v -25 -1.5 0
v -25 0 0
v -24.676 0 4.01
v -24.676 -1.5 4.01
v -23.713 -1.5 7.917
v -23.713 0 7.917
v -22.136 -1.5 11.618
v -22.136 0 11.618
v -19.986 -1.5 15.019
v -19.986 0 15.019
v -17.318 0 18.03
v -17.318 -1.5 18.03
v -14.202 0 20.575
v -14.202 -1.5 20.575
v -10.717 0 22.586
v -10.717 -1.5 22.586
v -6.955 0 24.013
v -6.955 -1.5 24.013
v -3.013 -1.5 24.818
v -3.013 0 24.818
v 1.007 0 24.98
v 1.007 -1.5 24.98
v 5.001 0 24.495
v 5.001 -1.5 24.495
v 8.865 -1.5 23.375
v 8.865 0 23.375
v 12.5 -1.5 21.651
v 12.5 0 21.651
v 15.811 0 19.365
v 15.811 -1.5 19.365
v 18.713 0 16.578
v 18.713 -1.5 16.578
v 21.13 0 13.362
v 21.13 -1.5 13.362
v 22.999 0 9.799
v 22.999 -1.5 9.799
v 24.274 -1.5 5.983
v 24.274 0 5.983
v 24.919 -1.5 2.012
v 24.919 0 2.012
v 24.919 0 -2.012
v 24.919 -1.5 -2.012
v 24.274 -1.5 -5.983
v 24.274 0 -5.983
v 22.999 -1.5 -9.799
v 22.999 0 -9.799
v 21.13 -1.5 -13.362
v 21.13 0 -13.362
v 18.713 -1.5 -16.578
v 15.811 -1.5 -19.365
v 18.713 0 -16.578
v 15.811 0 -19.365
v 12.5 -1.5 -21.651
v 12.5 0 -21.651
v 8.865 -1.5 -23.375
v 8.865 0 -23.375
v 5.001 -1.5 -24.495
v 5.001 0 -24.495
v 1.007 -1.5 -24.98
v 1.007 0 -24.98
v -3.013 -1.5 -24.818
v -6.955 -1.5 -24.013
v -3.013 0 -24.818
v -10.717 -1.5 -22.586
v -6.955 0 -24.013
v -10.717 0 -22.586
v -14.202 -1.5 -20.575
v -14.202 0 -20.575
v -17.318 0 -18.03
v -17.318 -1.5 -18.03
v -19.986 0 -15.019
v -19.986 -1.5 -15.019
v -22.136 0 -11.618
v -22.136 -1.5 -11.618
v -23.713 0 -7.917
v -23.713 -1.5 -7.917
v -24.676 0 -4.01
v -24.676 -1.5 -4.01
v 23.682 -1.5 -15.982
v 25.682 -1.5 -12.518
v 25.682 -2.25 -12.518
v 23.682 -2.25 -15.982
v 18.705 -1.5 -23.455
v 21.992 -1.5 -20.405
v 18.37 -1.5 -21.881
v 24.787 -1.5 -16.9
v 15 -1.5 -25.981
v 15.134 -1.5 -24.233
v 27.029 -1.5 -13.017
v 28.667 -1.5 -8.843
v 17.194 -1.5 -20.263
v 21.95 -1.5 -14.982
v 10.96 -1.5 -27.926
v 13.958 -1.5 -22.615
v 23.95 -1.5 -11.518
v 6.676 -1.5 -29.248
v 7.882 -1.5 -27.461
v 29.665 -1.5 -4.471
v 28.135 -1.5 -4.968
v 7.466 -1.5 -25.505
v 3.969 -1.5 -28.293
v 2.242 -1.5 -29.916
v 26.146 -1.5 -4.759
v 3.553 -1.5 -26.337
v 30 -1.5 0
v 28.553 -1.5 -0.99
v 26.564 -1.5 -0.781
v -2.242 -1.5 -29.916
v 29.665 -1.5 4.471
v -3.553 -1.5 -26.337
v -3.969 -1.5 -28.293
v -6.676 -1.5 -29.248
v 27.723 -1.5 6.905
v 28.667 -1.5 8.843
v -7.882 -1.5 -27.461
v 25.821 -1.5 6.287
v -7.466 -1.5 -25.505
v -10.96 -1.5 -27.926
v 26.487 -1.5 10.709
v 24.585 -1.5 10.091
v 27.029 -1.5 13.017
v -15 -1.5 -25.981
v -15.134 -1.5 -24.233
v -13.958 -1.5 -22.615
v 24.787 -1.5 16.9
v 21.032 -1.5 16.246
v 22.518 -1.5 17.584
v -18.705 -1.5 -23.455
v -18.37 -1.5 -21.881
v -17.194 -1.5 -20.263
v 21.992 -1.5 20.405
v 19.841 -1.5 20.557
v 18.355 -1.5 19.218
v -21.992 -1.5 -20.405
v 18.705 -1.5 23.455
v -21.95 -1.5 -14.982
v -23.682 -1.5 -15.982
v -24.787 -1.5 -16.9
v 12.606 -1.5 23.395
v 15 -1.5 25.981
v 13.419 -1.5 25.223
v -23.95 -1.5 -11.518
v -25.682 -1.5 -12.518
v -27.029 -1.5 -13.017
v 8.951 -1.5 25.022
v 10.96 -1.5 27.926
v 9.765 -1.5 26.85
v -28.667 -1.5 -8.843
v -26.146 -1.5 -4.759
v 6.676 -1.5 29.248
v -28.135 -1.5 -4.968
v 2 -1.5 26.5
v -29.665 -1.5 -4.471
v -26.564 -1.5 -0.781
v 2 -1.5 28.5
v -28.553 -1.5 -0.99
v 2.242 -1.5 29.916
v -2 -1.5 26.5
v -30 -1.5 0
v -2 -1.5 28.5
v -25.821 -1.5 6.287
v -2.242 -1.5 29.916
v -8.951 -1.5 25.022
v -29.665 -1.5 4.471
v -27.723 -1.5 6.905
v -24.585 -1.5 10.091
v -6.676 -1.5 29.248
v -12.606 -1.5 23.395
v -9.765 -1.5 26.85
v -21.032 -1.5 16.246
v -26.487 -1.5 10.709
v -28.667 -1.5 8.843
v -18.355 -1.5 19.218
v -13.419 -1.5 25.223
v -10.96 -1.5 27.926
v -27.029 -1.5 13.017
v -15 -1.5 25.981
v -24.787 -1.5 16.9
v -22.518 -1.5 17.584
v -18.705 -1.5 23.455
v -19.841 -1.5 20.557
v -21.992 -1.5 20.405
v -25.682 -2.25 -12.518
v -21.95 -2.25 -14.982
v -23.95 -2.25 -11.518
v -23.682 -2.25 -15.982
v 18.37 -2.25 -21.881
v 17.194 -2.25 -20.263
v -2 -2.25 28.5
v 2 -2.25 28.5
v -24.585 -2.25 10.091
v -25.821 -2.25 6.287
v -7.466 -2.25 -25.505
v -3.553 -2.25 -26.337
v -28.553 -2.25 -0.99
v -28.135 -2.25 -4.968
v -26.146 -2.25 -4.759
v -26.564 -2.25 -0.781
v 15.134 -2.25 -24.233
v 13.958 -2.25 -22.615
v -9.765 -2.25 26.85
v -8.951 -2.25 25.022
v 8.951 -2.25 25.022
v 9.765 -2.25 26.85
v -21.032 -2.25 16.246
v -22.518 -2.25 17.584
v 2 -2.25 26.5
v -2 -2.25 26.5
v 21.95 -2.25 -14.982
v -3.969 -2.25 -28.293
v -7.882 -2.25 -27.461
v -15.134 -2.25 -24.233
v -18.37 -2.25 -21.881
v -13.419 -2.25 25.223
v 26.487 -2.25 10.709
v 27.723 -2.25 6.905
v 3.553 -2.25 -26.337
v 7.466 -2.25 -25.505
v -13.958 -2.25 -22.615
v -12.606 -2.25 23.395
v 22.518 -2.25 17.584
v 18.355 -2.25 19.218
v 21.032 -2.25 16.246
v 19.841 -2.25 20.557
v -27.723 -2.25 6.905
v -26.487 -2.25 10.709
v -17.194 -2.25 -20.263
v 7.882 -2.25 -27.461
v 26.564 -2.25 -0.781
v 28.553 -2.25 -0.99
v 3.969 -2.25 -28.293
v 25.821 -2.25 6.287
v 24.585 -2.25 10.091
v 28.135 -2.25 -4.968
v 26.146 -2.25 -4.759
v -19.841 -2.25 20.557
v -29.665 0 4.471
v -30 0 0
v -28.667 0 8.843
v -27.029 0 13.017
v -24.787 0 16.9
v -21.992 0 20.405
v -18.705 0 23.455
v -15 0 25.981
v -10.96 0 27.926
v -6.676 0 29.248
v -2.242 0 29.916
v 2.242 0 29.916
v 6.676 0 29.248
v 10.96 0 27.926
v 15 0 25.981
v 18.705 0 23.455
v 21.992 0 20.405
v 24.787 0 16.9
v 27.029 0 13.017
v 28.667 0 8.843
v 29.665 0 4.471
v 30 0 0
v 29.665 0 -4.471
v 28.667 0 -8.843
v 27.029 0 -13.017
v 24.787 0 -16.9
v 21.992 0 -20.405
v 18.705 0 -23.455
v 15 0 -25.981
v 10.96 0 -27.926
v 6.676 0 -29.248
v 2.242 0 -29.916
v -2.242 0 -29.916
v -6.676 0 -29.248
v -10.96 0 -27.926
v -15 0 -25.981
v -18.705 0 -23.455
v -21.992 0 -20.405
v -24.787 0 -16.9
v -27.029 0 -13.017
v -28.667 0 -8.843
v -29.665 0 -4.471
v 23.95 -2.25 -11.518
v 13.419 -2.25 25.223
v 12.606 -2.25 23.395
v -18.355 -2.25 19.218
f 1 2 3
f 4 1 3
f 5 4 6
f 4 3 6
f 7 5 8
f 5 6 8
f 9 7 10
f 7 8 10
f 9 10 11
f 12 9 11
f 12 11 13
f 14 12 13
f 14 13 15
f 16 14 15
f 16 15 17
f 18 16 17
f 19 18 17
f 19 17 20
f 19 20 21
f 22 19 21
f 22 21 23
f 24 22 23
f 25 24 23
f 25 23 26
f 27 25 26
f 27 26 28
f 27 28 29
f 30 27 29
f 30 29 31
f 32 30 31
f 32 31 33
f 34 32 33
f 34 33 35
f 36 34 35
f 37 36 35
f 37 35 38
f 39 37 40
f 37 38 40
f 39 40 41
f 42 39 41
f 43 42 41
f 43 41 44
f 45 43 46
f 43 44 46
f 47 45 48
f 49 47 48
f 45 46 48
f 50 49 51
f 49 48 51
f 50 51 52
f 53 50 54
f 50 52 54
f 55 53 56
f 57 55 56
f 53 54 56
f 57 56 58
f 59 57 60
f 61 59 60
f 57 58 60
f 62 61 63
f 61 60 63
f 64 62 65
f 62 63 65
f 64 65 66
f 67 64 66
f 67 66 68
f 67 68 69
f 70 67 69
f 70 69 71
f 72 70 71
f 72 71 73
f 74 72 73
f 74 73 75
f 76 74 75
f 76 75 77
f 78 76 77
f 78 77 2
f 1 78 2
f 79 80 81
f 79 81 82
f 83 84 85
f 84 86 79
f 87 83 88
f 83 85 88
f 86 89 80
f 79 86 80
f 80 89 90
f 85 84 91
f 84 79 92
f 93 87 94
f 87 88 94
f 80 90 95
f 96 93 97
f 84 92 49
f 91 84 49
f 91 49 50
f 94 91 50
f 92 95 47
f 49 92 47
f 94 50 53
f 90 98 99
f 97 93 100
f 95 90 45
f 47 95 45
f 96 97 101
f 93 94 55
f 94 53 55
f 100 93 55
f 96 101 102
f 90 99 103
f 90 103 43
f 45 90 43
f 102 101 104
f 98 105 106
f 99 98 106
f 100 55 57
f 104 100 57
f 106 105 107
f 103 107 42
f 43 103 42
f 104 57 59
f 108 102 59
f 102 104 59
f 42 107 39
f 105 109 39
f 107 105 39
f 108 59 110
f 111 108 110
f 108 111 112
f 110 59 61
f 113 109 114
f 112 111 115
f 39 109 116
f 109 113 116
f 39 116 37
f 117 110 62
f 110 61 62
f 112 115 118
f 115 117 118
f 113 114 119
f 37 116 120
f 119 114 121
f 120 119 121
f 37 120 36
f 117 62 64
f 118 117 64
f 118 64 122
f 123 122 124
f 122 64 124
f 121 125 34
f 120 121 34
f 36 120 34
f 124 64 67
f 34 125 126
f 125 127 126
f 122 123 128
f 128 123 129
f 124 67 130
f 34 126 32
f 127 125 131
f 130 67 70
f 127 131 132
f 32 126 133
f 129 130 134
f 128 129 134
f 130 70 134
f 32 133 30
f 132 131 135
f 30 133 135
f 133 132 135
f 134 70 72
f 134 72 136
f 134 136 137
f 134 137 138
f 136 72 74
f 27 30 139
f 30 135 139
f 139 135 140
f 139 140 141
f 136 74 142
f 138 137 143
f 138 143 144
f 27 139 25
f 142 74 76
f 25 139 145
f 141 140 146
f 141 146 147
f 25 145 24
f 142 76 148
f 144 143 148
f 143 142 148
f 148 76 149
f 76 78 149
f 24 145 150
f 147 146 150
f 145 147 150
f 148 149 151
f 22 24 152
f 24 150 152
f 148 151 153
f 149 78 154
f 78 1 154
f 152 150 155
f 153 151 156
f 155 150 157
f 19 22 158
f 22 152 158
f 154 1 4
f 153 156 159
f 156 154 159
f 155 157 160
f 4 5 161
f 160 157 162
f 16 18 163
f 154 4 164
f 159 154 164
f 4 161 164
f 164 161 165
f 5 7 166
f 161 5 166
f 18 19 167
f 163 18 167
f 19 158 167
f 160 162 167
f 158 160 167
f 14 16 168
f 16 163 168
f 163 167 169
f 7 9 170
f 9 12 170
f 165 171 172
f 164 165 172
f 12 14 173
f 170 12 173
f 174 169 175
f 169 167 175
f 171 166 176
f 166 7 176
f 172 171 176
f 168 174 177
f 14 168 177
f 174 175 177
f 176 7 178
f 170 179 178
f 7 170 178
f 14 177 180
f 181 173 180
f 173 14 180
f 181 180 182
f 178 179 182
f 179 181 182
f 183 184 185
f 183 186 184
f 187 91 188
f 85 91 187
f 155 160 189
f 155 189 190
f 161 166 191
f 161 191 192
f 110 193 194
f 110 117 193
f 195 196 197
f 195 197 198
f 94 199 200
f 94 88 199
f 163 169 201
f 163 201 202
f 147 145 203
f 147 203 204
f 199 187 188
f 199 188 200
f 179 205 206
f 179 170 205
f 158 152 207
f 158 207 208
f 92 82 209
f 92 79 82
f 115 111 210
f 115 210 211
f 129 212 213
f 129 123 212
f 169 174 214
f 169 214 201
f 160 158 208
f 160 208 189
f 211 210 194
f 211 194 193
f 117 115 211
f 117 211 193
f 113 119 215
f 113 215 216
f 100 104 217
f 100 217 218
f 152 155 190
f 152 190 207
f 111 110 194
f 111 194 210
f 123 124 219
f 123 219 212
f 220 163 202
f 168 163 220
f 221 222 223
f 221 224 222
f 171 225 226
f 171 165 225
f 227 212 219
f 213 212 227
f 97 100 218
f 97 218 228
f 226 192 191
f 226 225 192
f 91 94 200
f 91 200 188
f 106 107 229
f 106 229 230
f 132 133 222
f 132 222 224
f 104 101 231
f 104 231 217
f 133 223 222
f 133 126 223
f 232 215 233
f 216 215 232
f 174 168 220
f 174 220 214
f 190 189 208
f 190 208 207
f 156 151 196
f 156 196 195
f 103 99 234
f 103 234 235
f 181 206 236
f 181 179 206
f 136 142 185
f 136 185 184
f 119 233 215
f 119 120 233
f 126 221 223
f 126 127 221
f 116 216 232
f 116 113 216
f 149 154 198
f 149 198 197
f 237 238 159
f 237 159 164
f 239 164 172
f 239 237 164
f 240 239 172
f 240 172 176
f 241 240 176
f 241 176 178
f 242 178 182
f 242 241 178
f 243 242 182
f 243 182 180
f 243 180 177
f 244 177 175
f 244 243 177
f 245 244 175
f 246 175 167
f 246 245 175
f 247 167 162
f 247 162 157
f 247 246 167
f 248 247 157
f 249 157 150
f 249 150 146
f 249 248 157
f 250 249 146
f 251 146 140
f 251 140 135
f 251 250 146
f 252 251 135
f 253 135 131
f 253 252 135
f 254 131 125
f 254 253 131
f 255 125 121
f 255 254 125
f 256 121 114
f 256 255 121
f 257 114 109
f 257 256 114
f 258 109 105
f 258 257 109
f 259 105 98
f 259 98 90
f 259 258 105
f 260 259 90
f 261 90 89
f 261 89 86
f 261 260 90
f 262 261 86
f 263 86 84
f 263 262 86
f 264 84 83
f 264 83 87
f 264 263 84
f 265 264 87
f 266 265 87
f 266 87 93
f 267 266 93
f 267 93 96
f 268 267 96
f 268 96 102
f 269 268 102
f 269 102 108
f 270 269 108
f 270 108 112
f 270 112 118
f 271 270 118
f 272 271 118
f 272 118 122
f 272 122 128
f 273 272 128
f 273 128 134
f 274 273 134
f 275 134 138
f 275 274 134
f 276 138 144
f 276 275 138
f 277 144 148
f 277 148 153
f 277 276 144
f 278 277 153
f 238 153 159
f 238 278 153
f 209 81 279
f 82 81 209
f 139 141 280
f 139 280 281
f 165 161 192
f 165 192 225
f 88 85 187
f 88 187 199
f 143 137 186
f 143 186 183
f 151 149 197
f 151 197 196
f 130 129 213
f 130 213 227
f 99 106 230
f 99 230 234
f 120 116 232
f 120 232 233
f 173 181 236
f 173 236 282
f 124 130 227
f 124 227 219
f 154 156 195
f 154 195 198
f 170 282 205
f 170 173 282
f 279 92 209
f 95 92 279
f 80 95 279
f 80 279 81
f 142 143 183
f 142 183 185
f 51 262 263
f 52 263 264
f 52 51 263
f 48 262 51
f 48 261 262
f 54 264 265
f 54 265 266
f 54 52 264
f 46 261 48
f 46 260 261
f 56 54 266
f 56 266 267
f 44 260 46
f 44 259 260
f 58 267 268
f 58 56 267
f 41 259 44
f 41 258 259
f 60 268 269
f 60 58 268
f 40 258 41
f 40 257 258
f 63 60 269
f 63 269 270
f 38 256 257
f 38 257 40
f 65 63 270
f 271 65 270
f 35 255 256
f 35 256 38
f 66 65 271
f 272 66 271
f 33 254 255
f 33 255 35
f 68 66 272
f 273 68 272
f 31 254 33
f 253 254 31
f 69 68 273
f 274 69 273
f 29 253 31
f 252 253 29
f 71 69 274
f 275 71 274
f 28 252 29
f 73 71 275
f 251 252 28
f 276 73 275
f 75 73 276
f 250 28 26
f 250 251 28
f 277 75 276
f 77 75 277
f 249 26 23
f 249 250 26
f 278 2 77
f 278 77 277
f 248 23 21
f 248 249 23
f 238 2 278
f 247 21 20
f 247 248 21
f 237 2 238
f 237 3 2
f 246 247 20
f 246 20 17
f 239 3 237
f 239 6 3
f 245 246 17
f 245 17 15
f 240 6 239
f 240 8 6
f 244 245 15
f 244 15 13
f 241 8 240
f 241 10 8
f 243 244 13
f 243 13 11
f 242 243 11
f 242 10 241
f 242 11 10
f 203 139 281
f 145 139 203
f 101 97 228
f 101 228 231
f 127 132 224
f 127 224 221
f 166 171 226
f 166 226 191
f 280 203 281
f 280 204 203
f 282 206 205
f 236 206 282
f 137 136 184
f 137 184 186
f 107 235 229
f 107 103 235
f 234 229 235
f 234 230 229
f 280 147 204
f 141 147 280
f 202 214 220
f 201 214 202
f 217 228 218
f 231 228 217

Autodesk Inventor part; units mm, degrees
ref_plane "YZ Plane" through (0, 0, 0) normal (1, 0, 0) x (0, 1, 0)
ref_plane "XZ Plane" through (0, 0, 0) normal (0, 1, 0) x (-1, 0, 0)
ref_plane "XY Plane" through (0, 0, 0) normal (0, 0, 1) x (1, 0, 0)
sketch "Sketch1" plane through (0, 0, 0) normal (0, 1, 0) x (-1, 0, 0)
  circle A0 centre (0, 0) radius 30
  circle A1 centre (0, 0) radius 25
  dimension "d0" = 60
  dimension "d1" = 50
extrude "Extrusion1" add sketch "Sketch1" against normal blind 1.5
sketch "Sketch2" plane through (0, -1.5, 0) normal (0, -1, 0) x (1, 0, 0)
  line L0 (-2, 28.5) -> (2, 28.5)
  line L1 (2, 28.5) -> (2, 26.5)
  line L2 (2, 26.5) -> (-2, 26.5)
  line L3 (-2, 26.5) -> (-2, 28.5)
  point P0 (0, 0)
  point P1 (0, 28.5)
  dimension "d4" = 2
  dimension "d5" = 26.5
  dimension "d6" = 4
extrude "Extrusion2" add sketch "Sketch2" along normal blind 0.75
pattern_circular "Circular Pattern1" count 15 over 360 about axis through (0, -10, 0) along (0, 1, 0) of "Extrusion2"
properties part number "fc18-097" material "Polypropylene"
